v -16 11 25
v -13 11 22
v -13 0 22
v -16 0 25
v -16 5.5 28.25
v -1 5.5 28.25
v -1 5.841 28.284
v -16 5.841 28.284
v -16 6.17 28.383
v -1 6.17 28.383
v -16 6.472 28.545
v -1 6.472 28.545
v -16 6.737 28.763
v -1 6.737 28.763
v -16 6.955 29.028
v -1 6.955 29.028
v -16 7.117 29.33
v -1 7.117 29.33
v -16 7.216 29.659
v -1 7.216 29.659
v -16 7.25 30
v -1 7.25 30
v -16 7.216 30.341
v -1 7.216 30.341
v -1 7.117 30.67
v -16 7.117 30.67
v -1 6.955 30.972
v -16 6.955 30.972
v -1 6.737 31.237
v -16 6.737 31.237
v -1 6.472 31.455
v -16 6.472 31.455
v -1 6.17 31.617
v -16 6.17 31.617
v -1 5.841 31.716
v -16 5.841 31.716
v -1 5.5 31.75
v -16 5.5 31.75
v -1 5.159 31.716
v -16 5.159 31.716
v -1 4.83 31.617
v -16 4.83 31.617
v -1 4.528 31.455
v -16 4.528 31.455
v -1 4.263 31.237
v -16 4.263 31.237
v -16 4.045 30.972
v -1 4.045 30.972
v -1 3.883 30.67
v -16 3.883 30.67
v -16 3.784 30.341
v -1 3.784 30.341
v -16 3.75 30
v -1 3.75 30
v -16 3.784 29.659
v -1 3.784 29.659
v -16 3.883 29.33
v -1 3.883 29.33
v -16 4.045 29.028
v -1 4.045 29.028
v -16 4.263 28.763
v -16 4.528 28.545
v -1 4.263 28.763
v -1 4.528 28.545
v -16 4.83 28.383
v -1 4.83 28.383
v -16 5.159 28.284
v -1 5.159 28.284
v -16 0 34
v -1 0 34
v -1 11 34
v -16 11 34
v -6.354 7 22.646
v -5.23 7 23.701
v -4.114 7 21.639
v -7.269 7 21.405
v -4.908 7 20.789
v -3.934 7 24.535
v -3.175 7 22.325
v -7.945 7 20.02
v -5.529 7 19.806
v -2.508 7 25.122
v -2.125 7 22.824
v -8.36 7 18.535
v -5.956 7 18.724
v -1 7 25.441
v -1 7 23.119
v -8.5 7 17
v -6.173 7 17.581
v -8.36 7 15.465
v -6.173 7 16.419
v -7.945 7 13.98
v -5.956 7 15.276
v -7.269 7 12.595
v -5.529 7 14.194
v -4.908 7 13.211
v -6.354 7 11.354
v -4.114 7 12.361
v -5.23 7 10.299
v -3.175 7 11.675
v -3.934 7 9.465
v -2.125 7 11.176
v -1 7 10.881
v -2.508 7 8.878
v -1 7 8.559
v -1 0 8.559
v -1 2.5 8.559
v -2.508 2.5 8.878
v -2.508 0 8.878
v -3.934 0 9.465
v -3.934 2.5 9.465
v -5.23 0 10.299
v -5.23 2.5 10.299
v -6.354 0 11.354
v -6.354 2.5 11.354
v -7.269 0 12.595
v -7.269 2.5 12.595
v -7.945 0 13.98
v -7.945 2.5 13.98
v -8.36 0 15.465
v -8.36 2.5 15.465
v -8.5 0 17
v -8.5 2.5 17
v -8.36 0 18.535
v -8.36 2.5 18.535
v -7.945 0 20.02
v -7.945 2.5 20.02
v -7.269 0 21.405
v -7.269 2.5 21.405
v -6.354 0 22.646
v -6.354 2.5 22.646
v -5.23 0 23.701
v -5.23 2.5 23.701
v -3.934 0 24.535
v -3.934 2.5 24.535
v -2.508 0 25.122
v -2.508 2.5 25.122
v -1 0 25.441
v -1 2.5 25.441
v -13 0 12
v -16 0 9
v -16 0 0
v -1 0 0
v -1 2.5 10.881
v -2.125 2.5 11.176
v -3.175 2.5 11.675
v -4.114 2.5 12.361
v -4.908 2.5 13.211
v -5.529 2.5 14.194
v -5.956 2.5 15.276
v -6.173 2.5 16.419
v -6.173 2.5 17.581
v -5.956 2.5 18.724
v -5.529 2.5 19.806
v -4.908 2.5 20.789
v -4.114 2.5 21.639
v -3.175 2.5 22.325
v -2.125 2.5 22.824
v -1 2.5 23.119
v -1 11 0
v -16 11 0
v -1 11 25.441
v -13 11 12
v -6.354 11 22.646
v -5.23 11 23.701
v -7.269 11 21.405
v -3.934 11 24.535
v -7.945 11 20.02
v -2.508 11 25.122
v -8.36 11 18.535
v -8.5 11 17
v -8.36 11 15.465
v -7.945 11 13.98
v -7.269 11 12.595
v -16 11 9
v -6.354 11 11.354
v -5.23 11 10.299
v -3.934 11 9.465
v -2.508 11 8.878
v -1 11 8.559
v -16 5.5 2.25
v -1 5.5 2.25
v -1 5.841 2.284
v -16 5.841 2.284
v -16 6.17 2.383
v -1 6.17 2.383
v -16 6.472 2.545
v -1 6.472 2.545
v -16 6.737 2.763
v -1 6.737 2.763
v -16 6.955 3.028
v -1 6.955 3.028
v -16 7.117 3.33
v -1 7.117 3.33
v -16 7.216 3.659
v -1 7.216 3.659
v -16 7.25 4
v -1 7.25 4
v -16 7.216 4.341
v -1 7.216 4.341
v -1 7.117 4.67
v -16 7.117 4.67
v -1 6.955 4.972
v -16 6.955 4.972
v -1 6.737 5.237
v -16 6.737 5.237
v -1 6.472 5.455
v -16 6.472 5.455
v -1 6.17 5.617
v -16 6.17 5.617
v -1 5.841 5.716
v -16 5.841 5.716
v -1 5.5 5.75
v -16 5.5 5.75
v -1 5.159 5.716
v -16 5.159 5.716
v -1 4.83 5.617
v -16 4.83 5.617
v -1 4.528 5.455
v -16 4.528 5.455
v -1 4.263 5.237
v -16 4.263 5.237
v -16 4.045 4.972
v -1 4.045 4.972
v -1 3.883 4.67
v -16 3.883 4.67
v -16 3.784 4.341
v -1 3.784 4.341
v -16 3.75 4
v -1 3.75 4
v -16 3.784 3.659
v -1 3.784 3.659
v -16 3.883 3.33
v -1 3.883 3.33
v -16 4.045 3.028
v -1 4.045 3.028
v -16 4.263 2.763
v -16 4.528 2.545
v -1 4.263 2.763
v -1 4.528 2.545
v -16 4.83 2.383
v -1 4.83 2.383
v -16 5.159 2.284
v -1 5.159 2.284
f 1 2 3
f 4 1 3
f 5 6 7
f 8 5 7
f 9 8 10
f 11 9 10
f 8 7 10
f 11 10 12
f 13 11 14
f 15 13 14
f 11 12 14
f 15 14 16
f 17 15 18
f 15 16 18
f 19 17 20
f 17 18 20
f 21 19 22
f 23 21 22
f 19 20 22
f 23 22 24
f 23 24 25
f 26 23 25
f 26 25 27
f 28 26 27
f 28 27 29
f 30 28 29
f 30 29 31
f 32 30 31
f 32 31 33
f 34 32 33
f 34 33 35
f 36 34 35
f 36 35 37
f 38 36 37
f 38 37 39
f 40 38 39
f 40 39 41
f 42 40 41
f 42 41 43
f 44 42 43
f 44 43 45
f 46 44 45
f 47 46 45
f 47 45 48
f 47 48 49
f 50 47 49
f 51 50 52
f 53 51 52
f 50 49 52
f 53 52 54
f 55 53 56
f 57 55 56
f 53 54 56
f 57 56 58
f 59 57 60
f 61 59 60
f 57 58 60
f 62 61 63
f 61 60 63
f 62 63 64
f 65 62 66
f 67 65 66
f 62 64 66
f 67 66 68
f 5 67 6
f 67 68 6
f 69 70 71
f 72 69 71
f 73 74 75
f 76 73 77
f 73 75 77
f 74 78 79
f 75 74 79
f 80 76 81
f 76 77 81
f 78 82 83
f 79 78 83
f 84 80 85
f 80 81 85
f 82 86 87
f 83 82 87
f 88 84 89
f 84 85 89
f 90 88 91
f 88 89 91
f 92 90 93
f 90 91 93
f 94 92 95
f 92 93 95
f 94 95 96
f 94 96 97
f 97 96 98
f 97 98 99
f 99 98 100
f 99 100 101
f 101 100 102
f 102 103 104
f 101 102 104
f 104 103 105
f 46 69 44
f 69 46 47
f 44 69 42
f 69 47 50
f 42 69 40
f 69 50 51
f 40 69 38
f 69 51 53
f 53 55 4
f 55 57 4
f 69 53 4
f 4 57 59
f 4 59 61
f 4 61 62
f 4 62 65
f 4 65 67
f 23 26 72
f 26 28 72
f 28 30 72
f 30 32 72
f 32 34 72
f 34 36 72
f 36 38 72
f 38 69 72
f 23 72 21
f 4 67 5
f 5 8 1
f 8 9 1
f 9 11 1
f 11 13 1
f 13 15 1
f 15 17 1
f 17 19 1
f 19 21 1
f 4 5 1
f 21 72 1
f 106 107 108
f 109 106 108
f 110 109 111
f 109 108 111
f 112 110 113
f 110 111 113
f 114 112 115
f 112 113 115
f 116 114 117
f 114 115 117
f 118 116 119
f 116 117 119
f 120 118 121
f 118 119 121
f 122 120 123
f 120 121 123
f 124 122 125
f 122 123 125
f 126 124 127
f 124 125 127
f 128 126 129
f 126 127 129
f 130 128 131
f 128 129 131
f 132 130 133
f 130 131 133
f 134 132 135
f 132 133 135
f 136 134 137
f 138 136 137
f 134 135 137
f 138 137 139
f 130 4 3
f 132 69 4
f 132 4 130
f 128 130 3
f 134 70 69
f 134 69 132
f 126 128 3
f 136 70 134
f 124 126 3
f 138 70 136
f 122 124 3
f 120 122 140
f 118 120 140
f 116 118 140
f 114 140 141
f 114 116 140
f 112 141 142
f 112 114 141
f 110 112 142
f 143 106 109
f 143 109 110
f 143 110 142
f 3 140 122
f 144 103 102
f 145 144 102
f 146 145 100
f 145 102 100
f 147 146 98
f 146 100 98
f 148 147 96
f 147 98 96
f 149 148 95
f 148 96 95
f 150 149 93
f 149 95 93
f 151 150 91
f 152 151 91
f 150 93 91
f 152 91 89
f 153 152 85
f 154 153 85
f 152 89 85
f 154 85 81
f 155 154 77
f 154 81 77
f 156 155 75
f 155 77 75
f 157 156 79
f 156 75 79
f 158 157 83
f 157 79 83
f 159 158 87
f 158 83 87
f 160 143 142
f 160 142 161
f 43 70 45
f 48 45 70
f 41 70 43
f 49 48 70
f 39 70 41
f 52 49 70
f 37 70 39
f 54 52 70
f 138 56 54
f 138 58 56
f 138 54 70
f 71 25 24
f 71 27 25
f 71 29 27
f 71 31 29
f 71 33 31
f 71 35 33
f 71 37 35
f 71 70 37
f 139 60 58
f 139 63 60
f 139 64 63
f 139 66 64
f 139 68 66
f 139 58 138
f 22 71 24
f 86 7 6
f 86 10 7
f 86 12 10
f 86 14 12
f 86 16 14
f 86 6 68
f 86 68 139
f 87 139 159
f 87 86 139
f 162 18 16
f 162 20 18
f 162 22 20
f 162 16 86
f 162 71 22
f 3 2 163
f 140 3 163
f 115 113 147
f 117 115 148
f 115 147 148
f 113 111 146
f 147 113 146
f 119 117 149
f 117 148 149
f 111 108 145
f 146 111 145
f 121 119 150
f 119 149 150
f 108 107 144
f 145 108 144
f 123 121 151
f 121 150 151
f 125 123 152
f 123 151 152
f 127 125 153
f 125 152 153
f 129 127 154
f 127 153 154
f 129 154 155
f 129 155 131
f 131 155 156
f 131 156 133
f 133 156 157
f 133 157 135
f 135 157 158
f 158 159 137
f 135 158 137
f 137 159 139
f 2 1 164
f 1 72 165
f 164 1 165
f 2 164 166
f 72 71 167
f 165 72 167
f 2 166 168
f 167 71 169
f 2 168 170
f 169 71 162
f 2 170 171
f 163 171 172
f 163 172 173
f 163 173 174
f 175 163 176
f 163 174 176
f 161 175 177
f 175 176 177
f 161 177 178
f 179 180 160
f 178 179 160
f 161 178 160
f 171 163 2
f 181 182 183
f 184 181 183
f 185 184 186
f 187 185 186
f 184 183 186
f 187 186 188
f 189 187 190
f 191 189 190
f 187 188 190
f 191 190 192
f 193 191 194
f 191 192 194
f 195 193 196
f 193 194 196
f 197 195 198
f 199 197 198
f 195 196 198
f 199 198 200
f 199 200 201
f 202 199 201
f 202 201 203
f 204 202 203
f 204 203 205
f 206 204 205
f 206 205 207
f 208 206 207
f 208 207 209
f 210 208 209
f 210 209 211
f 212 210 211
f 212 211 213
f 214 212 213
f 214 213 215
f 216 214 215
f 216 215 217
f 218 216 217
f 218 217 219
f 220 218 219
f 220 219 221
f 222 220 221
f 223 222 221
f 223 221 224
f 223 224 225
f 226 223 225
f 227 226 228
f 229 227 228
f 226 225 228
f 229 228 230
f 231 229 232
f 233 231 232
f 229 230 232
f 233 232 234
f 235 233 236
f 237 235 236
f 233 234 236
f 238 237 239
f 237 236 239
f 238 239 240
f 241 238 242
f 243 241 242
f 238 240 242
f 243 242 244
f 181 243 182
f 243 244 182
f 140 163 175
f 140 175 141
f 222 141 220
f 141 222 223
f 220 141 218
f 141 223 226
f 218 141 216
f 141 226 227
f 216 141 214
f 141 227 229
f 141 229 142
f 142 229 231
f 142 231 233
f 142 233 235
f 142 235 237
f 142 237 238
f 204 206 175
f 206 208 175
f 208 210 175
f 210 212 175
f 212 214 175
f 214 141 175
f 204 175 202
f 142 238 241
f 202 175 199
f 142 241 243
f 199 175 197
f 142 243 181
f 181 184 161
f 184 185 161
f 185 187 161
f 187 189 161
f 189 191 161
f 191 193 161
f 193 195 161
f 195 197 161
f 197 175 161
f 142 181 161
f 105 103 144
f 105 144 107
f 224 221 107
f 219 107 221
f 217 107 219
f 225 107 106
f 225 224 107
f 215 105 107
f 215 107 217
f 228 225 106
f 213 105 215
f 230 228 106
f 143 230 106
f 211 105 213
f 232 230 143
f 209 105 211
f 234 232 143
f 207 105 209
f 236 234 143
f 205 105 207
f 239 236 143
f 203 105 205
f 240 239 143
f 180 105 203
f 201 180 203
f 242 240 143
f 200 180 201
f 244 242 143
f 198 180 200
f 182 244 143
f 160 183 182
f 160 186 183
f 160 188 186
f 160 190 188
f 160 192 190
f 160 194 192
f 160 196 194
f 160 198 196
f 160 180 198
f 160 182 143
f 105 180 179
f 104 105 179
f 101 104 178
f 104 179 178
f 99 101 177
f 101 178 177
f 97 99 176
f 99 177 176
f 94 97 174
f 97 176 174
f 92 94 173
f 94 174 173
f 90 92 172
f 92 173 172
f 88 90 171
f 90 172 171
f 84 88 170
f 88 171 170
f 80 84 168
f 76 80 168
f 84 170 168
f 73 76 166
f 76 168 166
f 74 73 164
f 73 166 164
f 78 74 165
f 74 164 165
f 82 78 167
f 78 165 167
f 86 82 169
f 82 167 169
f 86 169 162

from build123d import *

# Parameters (mm, degrees)
SKETCH2_W           = 34
SKETCH2_H           = 11
SKETCH2_R           = 1.75
BOSS_EXTRUDE1_DEPTH = 16
SKETCH5_W           = 1
SKETCH5_H           = 34
SKETCH5_W_2         = 3
SKETCH5_H_2         = 10
CUT_EXTRUDE1_DEPTH  = 40.153543901
CHAMFER1_SIZE       = 3


with BuildPart() as part:
    # Sketch2 → Boss-Extrude1 (new body)
    with BuildSketch(Plane(origin=(0, 0, 0), x_dir=(0, 0, -1), z_dir=(1, 0, 0))):
        with Locations((-17, 5.5)):
            Rectangle(SKETCH2_W, SKETCH2_H)
        with Locations((-30, 5.5)):
            Circle(SKETCH2_R, mode=Mode.SUBTRACT)
        with Locations((-4, 5.5)):
            Circle(SKETCH2_R, mode=Mode.SUBTRACT)
    extrude(amount=-BOSS_EXTRUDE1_DEPTH)

    # Sketch4 → Cut-Revolve1 (revolve, cut)
    with BuildSketch(Plane(origin=(0, 0, 0), x_dir=(0, 0, -1), z_dir=(1, 0, 0))):
        Polygon((-17, 0), (-25.5, 0), (-25.5, 2.5), (-23.2, 2.5), (-23.2, 7), (-25.5, 7), (-25.5, 11), (-17, 11), align=None)
    revolve(axis=Axis((0, 0, 17), (0, 1, 0)), mode=Mode.SUBTRACT)

    # Sketch5 → Cut-Extrude1 (cut, through all)
    with BuildSketch(Plane(origin=(0, 11, 0), x_dir=(1, 0, 0), z_dir=(0, 1, 0))):
        with Locations((-0.5, -17)):
            Rectangle(SKETCH5_W, SKETCH5_H)
        with Locations((-14.5, -17)):
            Rectangle(SKETCH5_W_2, SKETCH5_H_2)
    extrude(amount=-CUT_EXTRUDE1_DEPTH, mode=Mode.SUBTRACT)

    # Chamfer1
    chamfer1_edges = [part.edges().sort_by_distance(p)[0] for p in [
        (-16, 5.5, 22),
        (-16, 5.5, 12),
    ]]
    chamfer(chamfer1_edges, length=CHAMFER1_SIZE - 0.0001)  # a hair under: the kernel refuses the full size


solid = part.part
